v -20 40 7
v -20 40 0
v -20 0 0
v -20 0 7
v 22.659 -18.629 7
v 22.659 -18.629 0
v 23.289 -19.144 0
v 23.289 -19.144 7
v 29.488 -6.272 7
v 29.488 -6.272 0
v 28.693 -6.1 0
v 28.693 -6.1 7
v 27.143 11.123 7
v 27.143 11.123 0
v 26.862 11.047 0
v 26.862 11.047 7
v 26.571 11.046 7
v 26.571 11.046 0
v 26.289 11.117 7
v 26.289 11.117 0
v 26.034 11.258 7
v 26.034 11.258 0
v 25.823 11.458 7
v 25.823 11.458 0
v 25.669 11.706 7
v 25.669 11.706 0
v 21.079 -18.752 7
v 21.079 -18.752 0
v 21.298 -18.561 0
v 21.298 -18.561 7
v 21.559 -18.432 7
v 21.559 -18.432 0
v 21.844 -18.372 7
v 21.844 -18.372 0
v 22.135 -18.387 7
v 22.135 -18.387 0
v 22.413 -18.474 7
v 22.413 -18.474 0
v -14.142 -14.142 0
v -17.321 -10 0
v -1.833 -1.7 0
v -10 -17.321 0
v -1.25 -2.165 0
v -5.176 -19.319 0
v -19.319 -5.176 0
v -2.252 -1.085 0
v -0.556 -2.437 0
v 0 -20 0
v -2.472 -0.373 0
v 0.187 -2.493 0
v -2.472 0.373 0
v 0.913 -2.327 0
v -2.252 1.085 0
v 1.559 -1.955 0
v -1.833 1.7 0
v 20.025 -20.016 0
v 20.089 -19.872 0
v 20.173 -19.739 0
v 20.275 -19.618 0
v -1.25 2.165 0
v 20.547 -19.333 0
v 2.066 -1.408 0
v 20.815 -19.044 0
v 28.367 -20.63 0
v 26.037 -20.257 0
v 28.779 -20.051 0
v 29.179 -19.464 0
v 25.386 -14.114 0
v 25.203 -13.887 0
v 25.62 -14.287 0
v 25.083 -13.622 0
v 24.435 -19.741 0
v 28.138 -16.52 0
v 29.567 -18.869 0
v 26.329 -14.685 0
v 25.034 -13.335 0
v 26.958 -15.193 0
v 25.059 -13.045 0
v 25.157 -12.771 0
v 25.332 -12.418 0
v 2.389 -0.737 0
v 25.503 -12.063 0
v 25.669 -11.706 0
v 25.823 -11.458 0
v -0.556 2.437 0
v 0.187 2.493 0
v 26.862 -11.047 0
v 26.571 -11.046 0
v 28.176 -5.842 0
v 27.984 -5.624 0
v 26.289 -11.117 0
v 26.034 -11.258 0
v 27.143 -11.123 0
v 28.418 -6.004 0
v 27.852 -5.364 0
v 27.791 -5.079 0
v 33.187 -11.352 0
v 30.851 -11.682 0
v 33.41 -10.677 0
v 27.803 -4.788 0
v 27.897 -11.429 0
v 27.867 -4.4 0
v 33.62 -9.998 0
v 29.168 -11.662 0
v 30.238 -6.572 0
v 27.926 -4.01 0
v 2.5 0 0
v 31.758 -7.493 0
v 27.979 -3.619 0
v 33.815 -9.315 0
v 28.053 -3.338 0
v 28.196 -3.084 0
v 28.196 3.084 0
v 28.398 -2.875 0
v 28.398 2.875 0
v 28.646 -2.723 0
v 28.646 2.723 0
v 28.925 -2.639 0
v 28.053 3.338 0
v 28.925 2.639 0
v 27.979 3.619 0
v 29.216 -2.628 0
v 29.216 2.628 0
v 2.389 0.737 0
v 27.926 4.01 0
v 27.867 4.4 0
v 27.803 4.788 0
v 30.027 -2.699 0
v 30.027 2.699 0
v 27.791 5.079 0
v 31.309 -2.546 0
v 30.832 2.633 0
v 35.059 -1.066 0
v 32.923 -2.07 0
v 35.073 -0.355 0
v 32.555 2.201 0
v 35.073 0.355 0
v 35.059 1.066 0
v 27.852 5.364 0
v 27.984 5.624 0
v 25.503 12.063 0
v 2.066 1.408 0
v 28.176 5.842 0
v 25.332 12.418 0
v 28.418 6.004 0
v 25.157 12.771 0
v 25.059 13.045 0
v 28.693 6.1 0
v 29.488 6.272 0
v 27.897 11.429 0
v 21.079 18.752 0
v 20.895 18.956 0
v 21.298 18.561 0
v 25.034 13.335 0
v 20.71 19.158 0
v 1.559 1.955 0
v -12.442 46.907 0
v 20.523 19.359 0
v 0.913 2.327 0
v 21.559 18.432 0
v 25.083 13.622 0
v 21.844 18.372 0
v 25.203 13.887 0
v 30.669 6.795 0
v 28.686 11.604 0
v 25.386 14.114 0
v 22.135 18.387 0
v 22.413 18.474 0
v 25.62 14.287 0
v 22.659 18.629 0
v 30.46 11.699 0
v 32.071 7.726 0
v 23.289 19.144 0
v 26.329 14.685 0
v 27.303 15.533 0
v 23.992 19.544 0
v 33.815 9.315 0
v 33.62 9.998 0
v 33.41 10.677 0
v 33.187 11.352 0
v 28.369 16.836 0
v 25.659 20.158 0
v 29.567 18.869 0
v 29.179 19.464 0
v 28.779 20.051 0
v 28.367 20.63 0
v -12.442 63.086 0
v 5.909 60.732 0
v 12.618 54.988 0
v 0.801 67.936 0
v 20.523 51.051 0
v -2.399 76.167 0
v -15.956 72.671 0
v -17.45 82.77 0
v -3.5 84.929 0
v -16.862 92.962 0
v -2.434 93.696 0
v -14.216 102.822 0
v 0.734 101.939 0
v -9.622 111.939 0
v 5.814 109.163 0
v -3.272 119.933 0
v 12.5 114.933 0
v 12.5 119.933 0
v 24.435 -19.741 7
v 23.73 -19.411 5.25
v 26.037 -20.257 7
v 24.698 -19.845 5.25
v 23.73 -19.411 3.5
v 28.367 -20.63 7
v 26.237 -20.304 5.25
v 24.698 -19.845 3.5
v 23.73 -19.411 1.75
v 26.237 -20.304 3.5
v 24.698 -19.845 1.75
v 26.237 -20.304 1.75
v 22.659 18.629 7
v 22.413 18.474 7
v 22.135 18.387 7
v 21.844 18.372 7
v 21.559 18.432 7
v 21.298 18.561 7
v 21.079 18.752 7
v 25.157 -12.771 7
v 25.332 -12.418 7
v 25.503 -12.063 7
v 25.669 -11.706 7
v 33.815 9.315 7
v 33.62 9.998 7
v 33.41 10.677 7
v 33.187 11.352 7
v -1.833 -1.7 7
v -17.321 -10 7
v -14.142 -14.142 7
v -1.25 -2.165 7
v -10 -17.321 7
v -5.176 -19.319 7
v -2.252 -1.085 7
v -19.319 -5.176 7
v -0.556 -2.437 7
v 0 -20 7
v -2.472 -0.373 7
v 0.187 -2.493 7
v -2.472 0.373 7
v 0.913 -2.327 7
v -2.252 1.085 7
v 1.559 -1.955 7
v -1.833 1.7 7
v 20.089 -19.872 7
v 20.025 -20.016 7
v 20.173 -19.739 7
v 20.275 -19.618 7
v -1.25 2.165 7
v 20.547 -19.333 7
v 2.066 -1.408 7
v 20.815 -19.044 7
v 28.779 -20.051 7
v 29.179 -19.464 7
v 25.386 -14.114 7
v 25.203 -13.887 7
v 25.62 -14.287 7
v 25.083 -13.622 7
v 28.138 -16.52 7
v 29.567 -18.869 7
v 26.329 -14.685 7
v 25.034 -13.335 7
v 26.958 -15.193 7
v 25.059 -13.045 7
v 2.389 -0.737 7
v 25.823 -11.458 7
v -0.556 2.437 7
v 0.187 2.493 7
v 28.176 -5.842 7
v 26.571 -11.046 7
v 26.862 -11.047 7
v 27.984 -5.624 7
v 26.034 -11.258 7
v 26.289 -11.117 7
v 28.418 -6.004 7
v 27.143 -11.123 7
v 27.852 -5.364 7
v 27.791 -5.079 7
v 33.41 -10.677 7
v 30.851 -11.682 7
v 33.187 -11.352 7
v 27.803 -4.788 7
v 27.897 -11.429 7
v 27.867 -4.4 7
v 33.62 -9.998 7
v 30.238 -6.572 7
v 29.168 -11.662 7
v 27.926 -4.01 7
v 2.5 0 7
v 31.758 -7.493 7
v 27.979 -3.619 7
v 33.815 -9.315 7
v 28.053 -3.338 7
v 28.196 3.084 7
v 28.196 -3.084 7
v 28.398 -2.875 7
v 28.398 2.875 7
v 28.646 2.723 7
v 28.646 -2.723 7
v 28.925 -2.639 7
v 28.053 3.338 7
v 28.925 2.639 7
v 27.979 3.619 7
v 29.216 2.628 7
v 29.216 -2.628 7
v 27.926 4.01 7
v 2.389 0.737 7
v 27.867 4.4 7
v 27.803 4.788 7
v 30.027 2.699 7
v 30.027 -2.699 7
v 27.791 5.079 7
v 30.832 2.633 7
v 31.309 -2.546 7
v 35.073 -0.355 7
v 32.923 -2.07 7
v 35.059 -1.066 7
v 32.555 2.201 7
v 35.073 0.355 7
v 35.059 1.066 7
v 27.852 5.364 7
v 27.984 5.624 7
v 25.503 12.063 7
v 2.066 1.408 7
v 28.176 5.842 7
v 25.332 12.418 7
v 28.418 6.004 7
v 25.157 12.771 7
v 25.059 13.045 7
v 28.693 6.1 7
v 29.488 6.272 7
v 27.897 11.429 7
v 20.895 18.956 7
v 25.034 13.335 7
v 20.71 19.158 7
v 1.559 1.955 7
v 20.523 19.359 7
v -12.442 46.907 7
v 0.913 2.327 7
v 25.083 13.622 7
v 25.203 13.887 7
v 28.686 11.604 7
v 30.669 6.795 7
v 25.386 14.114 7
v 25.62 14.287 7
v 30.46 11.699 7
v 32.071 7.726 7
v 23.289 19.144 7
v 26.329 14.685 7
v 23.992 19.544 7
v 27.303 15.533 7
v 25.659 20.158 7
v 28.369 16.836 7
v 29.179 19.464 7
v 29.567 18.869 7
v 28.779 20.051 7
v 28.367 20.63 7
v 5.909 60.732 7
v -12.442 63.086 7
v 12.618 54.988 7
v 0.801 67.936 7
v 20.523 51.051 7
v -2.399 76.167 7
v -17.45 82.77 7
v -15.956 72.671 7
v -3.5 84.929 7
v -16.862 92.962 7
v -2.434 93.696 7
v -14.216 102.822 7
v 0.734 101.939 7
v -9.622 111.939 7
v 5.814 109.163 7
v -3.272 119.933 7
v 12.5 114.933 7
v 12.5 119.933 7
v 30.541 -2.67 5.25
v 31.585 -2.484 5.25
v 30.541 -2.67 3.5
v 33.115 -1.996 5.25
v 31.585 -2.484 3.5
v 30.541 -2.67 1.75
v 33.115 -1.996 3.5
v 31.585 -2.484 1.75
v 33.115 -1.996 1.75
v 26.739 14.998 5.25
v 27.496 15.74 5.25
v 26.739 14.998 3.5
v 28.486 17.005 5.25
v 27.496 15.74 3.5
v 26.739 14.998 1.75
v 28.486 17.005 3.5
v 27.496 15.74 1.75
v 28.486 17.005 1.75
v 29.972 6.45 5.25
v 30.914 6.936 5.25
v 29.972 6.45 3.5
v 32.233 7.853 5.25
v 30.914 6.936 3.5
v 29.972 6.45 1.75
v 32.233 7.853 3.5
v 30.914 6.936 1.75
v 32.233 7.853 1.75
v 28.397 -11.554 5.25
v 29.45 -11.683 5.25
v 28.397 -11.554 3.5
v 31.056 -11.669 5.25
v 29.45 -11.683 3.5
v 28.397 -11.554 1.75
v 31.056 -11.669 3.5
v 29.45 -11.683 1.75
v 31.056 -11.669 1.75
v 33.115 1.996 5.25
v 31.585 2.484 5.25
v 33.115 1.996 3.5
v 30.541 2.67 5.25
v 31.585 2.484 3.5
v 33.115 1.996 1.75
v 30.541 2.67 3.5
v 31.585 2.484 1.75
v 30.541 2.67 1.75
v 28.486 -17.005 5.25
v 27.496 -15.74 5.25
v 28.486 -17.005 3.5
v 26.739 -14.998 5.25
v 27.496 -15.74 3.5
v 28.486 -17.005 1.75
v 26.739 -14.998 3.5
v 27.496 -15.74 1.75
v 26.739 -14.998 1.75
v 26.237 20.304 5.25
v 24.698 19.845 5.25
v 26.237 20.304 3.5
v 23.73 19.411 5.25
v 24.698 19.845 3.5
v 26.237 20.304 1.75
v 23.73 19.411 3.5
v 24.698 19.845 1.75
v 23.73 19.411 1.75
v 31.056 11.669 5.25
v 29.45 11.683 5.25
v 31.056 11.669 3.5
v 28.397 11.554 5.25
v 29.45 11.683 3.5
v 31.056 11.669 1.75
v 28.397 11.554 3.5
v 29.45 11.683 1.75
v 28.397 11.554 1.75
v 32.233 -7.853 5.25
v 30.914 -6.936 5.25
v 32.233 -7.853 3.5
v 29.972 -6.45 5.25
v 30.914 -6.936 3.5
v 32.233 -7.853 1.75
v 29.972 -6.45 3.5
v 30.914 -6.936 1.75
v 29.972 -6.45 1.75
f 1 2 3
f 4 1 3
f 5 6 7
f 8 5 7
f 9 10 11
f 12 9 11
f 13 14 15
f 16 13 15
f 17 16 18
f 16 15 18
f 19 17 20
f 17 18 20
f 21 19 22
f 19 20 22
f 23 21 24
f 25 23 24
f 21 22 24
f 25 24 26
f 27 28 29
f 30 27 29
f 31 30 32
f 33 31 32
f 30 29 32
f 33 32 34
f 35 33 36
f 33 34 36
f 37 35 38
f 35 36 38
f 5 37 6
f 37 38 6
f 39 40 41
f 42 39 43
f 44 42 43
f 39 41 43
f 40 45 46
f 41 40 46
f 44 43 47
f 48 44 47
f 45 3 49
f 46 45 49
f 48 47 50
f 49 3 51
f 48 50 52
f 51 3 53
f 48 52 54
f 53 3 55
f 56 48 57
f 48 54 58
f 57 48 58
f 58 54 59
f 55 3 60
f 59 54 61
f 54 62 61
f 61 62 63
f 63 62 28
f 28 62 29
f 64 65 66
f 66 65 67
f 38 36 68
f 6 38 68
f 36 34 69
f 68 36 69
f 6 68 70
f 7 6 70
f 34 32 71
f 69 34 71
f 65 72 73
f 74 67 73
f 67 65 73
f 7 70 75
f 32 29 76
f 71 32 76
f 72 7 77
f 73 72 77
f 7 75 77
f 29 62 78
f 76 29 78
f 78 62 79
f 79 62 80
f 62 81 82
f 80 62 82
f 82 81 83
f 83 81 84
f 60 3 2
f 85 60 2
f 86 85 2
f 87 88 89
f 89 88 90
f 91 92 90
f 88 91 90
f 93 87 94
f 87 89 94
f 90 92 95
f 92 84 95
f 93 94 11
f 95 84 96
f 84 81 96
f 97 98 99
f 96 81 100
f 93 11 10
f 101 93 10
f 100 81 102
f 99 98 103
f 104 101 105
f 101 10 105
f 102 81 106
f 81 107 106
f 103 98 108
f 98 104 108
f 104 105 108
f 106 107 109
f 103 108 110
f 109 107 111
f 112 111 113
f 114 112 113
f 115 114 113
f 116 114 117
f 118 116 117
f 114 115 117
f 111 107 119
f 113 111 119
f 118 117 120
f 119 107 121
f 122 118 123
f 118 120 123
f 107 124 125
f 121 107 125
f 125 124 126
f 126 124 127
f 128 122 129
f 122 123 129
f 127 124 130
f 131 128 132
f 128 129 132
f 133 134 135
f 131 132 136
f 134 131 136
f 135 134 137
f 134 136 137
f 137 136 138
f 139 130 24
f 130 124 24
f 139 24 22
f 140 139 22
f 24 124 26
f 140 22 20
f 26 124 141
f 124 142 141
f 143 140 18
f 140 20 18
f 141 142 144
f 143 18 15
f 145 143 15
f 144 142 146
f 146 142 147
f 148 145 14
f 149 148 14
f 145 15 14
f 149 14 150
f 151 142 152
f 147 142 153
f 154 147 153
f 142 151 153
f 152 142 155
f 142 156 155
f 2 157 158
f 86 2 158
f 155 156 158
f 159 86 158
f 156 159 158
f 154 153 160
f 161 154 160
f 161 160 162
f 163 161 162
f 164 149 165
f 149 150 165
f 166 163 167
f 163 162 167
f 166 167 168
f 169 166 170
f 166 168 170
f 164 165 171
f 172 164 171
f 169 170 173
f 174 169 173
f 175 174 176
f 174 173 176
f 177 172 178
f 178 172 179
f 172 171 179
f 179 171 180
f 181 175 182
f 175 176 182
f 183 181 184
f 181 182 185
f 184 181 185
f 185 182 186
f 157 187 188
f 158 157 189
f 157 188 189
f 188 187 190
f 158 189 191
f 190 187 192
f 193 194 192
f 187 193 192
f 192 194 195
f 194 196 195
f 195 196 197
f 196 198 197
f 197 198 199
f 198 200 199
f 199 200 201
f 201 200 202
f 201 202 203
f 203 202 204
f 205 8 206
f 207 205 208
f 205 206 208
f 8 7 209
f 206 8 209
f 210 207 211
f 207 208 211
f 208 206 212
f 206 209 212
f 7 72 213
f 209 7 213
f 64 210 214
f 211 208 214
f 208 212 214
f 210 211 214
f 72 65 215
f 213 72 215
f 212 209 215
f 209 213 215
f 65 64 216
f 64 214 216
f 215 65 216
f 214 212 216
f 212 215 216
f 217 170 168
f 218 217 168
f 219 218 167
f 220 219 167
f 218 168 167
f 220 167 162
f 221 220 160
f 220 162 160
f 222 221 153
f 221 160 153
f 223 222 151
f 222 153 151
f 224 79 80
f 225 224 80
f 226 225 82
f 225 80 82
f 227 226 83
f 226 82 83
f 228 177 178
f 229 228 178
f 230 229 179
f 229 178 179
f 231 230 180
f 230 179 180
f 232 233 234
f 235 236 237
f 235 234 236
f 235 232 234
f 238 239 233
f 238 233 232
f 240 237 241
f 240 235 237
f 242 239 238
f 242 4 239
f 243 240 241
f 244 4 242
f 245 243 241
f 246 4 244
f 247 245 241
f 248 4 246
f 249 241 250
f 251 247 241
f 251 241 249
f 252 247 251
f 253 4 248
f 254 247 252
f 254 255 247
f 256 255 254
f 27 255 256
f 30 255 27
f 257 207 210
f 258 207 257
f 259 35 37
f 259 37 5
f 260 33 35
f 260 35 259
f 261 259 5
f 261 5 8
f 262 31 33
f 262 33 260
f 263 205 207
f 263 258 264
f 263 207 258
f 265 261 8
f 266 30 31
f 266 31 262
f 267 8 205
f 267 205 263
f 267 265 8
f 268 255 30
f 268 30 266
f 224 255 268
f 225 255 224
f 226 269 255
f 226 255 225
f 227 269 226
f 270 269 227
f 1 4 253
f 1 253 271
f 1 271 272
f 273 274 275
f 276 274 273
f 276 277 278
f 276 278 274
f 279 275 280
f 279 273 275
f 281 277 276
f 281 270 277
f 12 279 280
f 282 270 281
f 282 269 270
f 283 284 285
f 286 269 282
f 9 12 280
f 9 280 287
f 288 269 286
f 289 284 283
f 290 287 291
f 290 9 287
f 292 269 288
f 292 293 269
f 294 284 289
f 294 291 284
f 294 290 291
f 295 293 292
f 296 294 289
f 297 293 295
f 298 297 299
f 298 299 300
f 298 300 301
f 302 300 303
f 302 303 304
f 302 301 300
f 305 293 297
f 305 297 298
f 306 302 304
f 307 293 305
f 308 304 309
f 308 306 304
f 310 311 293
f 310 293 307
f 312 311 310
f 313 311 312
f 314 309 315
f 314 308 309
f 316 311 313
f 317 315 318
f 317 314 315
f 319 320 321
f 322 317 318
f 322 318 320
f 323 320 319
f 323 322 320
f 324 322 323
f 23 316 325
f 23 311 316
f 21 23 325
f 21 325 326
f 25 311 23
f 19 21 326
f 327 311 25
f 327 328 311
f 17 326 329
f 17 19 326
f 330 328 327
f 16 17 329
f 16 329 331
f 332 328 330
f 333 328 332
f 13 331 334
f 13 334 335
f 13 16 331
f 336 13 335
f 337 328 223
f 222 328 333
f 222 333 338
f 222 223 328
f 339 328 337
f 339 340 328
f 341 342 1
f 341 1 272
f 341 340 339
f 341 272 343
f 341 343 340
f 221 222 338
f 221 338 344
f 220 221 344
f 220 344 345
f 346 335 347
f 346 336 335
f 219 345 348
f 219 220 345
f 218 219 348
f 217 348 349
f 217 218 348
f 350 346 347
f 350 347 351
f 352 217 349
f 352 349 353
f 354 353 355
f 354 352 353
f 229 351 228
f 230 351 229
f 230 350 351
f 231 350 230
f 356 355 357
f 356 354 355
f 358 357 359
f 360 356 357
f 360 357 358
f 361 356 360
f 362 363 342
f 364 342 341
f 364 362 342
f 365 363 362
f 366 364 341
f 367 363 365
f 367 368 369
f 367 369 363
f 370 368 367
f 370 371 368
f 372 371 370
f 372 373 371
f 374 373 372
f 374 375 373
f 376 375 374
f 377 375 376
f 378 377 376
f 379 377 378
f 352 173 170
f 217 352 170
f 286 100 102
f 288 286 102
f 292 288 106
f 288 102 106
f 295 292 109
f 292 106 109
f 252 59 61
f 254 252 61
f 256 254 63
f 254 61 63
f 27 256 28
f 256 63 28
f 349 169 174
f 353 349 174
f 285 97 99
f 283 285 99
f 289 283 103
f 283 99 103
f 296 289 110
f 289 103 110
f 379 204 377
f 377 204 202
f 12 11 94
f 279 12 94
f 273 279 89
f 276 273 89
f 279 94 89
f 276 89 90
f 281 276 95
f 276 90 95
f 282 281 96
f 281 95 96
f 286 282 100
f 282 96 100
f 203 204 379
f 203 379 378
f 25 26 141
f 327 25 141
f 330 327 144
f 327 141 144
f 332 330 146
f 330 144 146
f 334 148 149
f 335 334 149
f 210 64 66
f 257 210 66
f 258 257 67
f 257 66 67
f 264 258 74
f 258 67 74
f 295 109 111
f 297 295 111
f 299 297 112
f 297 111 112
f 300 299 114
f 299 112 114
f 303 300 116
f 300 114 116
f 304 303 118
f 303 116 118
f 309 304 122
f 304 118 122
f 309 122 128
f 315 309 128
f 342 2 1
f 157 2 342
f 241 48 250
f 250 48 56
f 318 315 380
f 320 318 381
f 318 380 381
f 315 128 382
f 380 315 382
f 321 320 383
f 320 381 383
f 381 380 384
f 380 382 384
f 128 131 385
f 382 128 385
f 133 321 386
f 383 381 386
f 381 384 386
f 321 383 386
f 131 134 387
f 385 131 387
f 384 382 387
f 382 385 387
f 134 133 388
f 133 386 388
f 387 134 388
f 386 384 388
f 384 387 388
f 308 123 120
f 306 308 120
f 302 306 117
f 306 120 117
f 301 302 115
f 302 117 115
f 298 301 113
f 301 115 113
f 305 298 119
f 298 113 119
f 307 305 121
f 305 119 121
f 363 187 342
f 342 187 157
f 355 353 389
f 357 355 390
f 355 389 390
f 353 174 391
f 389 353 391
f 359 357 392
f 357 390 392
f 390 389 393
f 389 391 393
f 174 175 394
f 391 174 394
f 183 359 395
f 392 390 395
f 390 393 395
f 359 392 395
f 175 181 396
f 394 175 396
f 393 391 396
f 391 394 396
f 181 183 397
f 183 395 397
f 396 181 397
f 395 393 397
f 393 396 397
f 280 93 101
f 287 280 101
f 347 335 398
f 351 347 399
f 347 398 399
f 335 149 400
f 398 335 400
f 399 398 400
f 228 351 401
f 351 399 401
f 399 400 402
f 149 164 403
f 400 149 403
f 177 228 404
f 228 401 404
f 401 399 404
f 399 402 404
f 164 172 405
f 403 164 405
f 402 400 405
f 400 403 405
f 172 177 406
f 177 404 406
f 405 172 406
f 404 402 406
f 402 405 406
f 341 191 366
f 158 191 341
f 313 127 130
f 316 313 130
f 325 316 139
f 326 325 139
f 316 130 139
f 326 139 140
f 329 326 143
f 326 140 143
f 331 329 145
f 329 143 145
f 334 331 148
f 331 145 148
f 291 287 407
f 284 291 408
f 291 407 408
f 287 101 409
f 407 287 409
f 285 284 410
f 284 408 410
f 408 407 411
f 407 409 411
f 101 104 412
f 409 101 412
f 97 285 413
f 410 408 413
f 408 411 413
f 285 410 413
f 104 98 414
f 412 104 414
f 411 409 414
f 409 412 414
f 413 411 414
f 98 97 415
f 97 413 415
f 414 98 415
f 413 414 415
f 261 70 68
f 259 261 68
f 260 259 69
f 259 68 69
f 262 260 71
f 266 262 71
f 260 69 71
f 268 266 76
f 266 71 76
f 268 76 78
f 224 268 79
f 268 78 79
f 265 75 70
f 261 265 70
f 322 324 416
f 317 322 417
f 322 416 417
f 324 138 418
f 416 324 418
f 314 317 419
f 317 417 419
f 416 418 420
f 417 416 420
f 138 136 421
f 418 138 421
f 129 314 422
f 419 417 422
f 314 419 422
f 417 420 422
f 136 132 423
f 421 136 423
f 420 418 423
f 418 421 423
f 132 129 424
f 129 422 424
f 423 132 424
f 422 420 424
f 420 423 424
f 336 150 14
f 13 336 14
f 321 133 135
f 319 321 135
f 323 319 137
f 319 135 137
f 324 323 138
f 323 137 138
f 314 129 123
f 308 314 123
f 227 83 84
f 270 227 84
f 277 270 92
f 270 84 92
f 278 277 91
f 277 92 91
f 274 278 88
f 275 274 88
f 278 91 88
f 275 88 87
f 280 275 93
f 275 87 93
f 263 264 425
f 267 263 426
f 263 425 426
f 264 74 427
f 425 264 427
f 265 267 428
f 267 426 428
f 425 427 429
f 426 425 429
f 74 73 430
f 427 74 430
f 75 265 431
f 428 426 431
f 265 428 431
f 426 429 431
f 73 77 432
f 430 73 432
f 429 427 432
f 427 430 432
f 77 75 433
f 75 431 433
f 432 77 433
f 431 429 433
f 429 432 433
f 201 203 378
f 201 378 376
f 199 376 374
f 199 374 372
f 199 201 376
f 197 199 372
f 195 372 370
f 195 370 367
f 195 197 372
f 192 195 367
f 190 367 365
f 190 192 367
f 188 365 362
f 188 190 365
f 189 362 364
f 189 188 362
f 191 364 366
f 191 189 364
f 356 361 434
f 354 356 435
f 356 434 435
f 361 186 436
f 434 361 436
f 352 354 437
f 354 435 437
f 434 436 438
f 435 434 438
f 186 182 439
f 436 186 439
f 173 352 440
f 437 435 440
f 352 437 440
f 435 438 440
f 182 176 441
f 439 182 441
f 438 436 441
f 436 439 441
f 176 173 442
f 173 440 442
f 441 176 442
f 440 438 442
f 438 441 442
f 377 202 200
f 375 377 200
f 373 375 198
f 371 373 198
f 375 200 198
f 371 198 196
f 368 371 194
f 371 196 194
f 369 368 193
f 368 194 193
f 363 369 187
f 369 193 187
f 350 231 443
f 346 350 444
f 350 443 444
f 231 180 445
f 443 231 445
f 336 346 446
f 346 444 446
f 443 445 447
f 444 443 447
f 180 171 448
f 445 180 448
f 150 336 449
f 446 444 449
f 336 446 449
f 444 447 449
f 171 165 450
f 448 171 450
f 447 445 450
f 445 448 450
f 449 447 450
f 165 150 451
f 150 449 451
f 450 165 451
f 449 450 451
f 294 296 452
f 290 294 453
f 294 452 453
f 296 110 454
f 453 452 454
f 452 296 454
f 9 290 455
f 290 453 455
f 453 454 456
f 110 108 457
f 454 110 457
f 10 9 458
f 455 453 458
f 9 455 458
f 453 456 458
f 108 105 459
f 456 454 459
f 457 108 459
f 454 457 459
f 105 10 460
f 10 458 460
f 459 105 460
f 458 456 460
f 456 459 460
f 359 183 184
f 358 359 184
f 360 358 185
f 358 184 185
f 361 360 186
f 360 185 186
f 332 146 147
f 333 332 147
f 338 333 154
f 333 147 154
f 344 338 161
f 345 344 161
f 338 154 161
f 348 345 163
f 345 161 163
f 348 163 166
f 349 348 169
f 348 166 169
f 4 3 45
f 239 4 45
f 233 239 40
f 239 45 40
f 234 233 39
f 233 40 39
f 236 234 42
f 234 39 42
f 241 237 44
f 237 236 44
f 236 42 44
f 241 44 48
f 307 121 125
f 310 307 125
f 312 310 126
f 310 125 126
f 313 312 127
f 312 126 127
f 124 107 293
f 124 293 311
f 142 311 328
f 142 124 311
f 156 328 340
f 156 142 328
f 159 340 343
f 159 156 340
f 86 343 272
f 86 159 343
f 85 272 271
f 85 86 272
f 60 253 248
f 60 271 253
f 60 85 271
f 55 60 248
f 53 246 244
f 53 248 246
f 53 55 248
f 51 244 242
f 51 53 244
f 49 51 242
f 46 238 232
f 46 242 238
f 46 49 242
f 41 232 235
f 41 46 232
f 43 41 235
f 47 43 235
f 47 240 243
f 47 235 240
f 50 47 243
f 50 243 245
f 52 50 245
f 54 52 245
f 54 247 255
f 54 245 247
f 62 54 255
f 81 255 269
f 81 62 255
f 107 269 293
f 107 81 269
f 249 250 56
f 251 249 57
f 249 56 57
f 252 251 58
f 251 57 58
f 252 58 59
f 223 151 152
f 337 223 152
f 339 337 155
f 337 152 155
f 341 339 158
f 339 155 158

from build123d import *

# Parameters (mm, degrees)
SKETCH002_W       = 3.675859
SKETCH002_H       = 9.820133
PAD002_DEPTH      = 10
CYLINDER001_R     = 2.5
CYLINDER001_DEPTH = 30
PAD_DEPTH         = 7
PAD001_DEPTH      = 7


with BuildPart() as gearcutter_g:
    # Sketch002 → Pad002 (new body)
    with BuildSketch(Plane.XY):
        with BuildLine():
            Line((-20, 35), (-38.772621, 35))
            Line((-38.772621, 35), (-38.772621, -38.212818))
            Line((-38.772621, -38.212818), (39.418999, -38.212818))
            Line((20.044458, -20.01598), (39.418999, -38.212818))
            Line((0, -20), (20.044458, -20.01598))
            ThreePointArc((-20, 0), (-14.142136, -14.142136), (0, -20))
            Line((-20, 35), (-20, 0))
        make_face()
        with Locations((21.83793, 25.089934)):
            Rectangle(SKETCH002_W, SKETCH002_H)
    extrude(amount=PAD002_DEPTH)


with BuildPart() as hole:
    # Cylinder001 → Cylinder001 (new body)
    with BuildSketch(Plane.XY.offset(-10)):
        Circle(CYLINDER001_R)
    extrude(amount=CYLINDER001_DEPTH)


with BuildPart() as cut001:
    # InvoluteGear → Pad (new body)
    with BuildSketch(Plane.XY):
        with BuildLine():
            Line((29.216017, -2.627852), (30.02668, -2.698596))
            add(Edge.make_bspline(
                [(30.02668, -2.698596), (30.269336, -2.702327), (31.240634, -2.684194), (32.940327, -2.265756), (35.058609, -1.065575)],
                knots=[0, 0, 0, 0, 0, 1, 1, 1, 1, 1], degree=4))
            ThreePointArc((35.058609, -1.065575), (35.074799, 0), (35.058609, 1.065575))
            add(Edge.make_bspline(
                [(35.058609, 1.065575), (32.940327, 2.265756), (31.240634, 2.684194), (30.269336, 2.702327), (30.02668, 2.698596)],
                knots=[0, 0, 0, 0, 0, 1, 1, 1, 1, 1], degree=4))
            Line((30.02668, 2.698596), (29.216017, 2.627852))
            ThreePointArc((29.216017, 2.627852), (28.398075, 2.874673), (27.979368, 3.61941))
            ThreePointArc((27.979368, 3.61941), (27.89739, 4.204855), (27.803163, 4.788454))
            ThreePointArc((27.803163, 4.788454), (27.983753, 5.62352), (28.692604, 6.100468))
            Line((28.692604, 6.100468), (29.488104, 6.271815))
            add(Edge.make_bspline(
                [(29.488104, 6.271815), (29.72108, 6.339774), (30.64388, 6.643396), (32.144724, 7.544237), (33.815137, 9.315472)],
                knots=[0, 0, 0, 0, 0, 1, 1, 1, 1, 1], degree=4))
            ThreePointArc((33.815137, 9.315472), (33.516524, 10.338478), (33.18697, 11.351941))
            add(Edge.make_bspline(
                [(33.18697, 11.351941), (30.809038, 11.874427), (29.06152, 11.773281), (28.12803, 11.504313), (27.897254, 11.429224)],
                knots=[0, 0, 0, 0, 0, 1, 1, 1, 1, 1], degree=4))
            Line((27.897254, 11.429224), (27.143458, 11.122676))
            ThreePointArc((27.143458, 11.122676), (26.289104, 11.117439), (25.669483, 11.705673))
            ThreePointArc((25.669483, 11.705673), (25.418584, 12.240945), (25.156525, 12.770842))
            ThreePointArc((25.156525, 12.770842), (25.082952, 13.622039), (25.619728, 14.286735))
            Line((25.619728, 14.286735), (26.32938, 14.684947))
            add(Edge.make_bspline(
                [(26.32938, 14.684947), (26.531974, 14.818557), (27.324283, 15.380691), (28.492921, 16.683892), (29.567042, 18.868799)],
                knots=[0, 0, 0, 0, 0, 1, 1, 1, 1, 1], degree=4))
            ThreePointArc((29.567042, 18.868799), (28.980159, 19.758338), (28.366523, 20.629637))
            add(Edge.make_bspline(
                [(28.366523, 20.629637), (25.94023, 20.428003), (24.300163, 19.816261), (23.487425, 19.284092), (23.289034, 19.144315)],
                knots=[0, 0, 0, 0, 0, 1, 1, 1, 1, 1], degree=4))
            Line((23.289034, 19.144315), (22.659084, 18.629202))
            ThreePointArc((22.659084, 18.629202), (21.84423, 18.372372), (21.078752, 18.751836))
            ThreePointArc((21.078752, 18.751836), (20.681226, 19.189373), (20.274619, 19.618485))
            ThreePointArc((20.274619, 19.618485), (19.95342, 20.41018), (20.270426, 21.203563))
            Line((20.270426, 21.203563), (20.831176, 21.793257))
            add(Edge.make_bspline(
                [(20.831176, 21.793257), (20.985387, 21.980647), (21.576804, 22.751344), (22.309397, 24.341109), (22.691785, 26.745549)],
                knots=[0, 0, 0, 0, 0, 1, 1, 1, 1, 1], degree=4))
            ThreePointArc((22.691785, 26.745549), (21.868779, 27.422582), (21.025585, 28.074299))
            add(Edge.make_bspline(
                [(21.025585, 28.074299), (18.766519, 27.166461), (17.37963, 26.098479), (16.759858, 25.350393), (16.611482, 25.15835)],
                knots=[0, 0, 0, 0, 0, 1, 1, 1, 1, 1], degree=4))
            Line((16.611482, 25.15835), (16.161351, 24.480441))
            ThreePointArc((16.161351, 24.480441), (15.4584, 23.994839), (14.615082, 24.131816))
            ThreePointArc((14.615082, 24.131816), (14.10625, 24.432742), (13.591225, 24.72294))
            ThreePointArc((13.591225, 24.72294), (13.05094, 25.384787), (13.120008, 26.236361))
            Line((13.120008, 26.236361), (13.48203, 26.96514))
            add(Edge.make_bspline(
                [(13.48203, 26.96514), (13.574155, 27.18966), (13.912131, 28.10044), (14.143586, 29.835512), (13.800264, 32.245841)],
                knots=[0, 0, 0, 0, 0, 1, 1, 1, 1, 1], degree=4))
            ThreePointArc((13.800264, 32.245841), (12.814263, 32.65021), (11.816433, 33.024437))
            add(Edge.make_bspline(
                [(11.816433, 33.024437), (9.92532, 31.49106), (8.91484, 30.061732), (8.543105, 29.164202), (8.457926, 28.936956)],
                knots=[0, 0, 0, 0, 0, 1, 1, 1, 1, 1], degree=4))
            Line((8.457926, 28.936956), (8.227611, 28.156485))
            ThreePointArc((8.227611, 28.156485), (7.699024, 27.485259), (6.852797, 27.367578))
            ThreePointArc((6.852797, 27.367578), (6.277872, 27.505154), (5.70019, 27.630653))
            ThreePointArc((5.70019, 27.630653), (4.988826, 28.103844), (4.80382, 28.937943))
            Line((4.80382, 28.937943), (4.934946, 29.741053))
            add(Edge.make_bspline(
                [(4.934946, 29.741053), (4.956801, 29.982752), (5.011304, 30.952689), (4.721054, 32.678899), (3.682528, 34.880948)],
                knots=[0, 0, 0, 0, 0, 1, 1, 1, 1, 1], degree=4))
            ThreePointArc((3.682528, 34.880948), (2.621143, 34.976723), (1.557338, 35.040209))
            add(Edge.make_bspline(
                [(1.557338, 35.040209), (0.202213, 33.01754), (-0.342073, 31.353869), (-0.43274, 30.386642), (-0.447153, 30.144385)],
                knots=[0, 0, 0, 0, 0, 1, 1, 1, 1, 1], degree=4))
            Line((-0.447153, 30.144385), (-0.437188, 29.330703))
            ThreePointArc((-0.437188, 29.330703), (-0.744444, 28.533493), (-1.518389, 28.171611))
            ThreePointArc((-1.518389, 28.171611), (-2.108323, 28.133612), (-2.697331, 28.083261))
            ThreePointArc((-2.697331, 28.083261), (-3.516567, 28.325751), (-3.939209, 29.068262))
            Line((-3.939209, 29.068262), (-4.050629, 29.874342))
            add(Edge.make_bspline(
                [(-4.050629, 29.874342), (-4.100987, 30.111745), (-4.3348, 31.054656), (-5.120964, 32.618623), (-6.762416, 34.416729)],
                knots=[0, 0, 0, 0, 0, 1, 1, 1, 1, 1], degree=4))
            ThreePointArc((-6.762416, 34.416729), (-7.804877, 34.195401), (-8.840133, 33.942504))
            add(Edge.make_bspline(
                [(-8.840133, 33.942504), (-9.538861, 31.610267), (-9.56859, 29.860077), (-9.370135, 28.909097), (-9.312501, 28.673354)],
                knots=[0, 0, 0, 0, 0, 1, 1, 1, 1, 1], degree=4))
            Line((-9.312501, 28.673354), (-9.063142, 27.898758))
            ThreePointArc((-9.063142, 27.898758), (-9.121765, 27.046401), (-9.754659, 26.472472))
            ThreePointArc((-9.754659, 26.472472), (-10.307184, 26.262276), (-10.855183, 26.040548))
            ThreePointArc((-10.855183, 26.040548), (-11.709498, 26.030791), (-12.332222, 26.615739))
            Line((-12.332222, 26.615739), (-12.676288, 27.353165))
            add(Edge.make_bspline(
                [(-12.676288, 27.353165), (-12.794385, 27.565178), (-13.295737, 28.39728), (-14.507962, 29.660038), (-16.60649, 30.894434)],
                knots=[0, 0, 0, 0, 0, 1, 1, 1, 1, 1], degree=4))
            ThreePointArc((-16.60649, 30.894434), (-17.537399, 30.375667), (-18.452119, 29.828859))
            add(Edge.make_bspline(
                [(-18.452119, 29.828859), (-18.432366, 27.394282), (-17.944897, 25.713086), (-17.474952, 24.862851), (-17.350392, 24.65457)],
                knots=[0, 0, 0, 0, 0, 1, 1, 1, 1, 1], degree=4))
            Line((-17.350392, 24.65457), (-16.883795, 23.987887))
            ThreePointArc((-16.883795, 23.987887), (-16.688578, 23.156118), (-17.124185, 22.421138))
            ThreePointArc((-17.124185, 22.421138), (-17.590206, 22.057421), (-18.048504, 21.684019))
            ThreePointArc((-18.048504, 21.684019), (-18.861988, 21.422881), (-19.629463, 21.79829))
            Line((-19.629463, 21.79829), (-20.175603, 22.401539))
            add(Edge.make_bspline(
                [(-20.175603, 22.401539), (-20.350945, 22.569323), (-21.07529, 23.216681), (-22.605863, 24.066029), (-24.975004, 24.627032)],
                knots=[0, 0, 0, 0, 0, 1, 1, 1, 1, 1], degree=4))
            ThreePointArc((-24.975004, 24.627032), (-25.711647, 23.856922), (-26.424554, 23.064789))
            add(Edge.make_bspline(
                [(-26.424554, 23.064789), (-25.688074, 20.744196), (-24.726721, 19.281374), (-24.027043, 18.607432), (-23.846625, 18.445118)],
                knots=[0, 0, 0, 0, 0, 1, 1, 1, 1, 1], degree=4))
            Line((-23.846625, 18.445118), (-23.204249, 17.945586))
            ThreePointArc((-23.204249, 17.945586), (-22.772537, 17.208312), (-22.972152, 16.377588))
            ThreePointArc((-22.972152, 16.377588), (-23.310261, 15.892667), (-23.638136, 15.400768))
            ThreePointArc((-23.638136, 15.400768), (-24.338508, 14.911454), (-25.182539, 15.043968))
            Line((-25.182539, 15.043968), (-25.882227, 15.459439))
            add(Edge.make_bspline(
                [(-25.882227, 15.459439), (-26.099234, 15.568085), (-26.982211, 15.973178), (-28.695135, 16.333648), (-31.12438, 16.17141)],
                knots=[0, 0, 0, 0, 0, 1, 1, 1, 1, 1], degree=4))
            ThreePointArc((-31.12438, 16.17141), (-31.601302, 15.218385), (-32.049051, 14.251311))
            add(Edge.make_bspline(
                [(-32.049051, 14.251311), (-30.661284, 12.250897), (-29.311467, 11.136428), (-28.444225, 10.698661), (-28.22398, 10.596737)],
                knots=[0, 0, 0, 0, 0, 1, 1, 1, 1, 1], degree=4))
            Line((-28.22398, 10.596737), (-27.462904, 10.308742))
            ThreePointArc((-27.462904, 10.308742), (-26.833056, 9.731472), (-26.778943, 8.878817))
            ThreePointArc((-26.778943, 8.878817), (-26.959098, 8.31578), (-27.127416, 7.749093))
            ThreePointArc((-27.127416, 7.749093), (-27.652445, 7.075079), (-28.498037, 6.952923))
            Line((-28.498037, 6.952923), (-29.289102, 7.143699))
            add(Edge.make_bspline(
                [(-29.289102, 7.143699), (-29.528492, 7.183554), (-30.491644, 7.310388), (-32.234718, 7.14995), (-34.508218, 6.278888)],
                knots=[0, 0, 0, 0, 0, 1, 1, 1, 1, 1], degree=4))
            ThreePointArc((-34.508218, 6.278888), (-34.683042, 5.227628), (-34.825849, 4.171541))
            add(Edge.make_bspline(
                [(-34.825849, 4.171541), (-32.910105, 2.669052), (-31.29176, 2.001961), (-30.334014, 1.839267), (-30.093511, 1.80679)],
                knots=[0, 0, 0, 0, 0, 1, 1, 1, 1, 1], degree=4))
            Line((-30.093511, 1.80679), (-29.281359, 1.75592))
            ThreePointArc((-29.281359, 1.75592), (-28.50934, 1.389948), (-28.206307, 0.591124))
            ThreePointArc((-28.206307, 0.591124), (-28.2125, 0), (-28.206307, -0.591124))
            ThreePointArc((-28.206307, -0.591124), (-28.50934, -1.389948), (-29.281359, -1.75592))
            Line((-29.281359, -1.75592), (-30.093511, -1.80679))
            add(Edge.make_bspline(
                [(-30.093511, -1.80679), (-30.334014, -1.839267), (-31.29176, -2.001961), (-32.910105, -2.669052), (-34.825849, -4.171541)],
                knots=[0, 0, 0, 0, 0, 1, 1, 1, 1, 1], degree=4))
            ThreePointArc((-34.825849, -4.171541), (-34.683042, -5.227628), (-34.508218, -6.278888))
            add(Edge.make_bspline(
                [(-34.508218, -6.278888), (-32.234718, -7.14995), (-30.491644, -7.310388), (-29.528492, -7.183554), (-29.289102, -7.143699)],
                knots=[0, 0, 0, 0, 0, 1, 1, 1, 1, 1], degree=4))
            Line((-29.289102, -7.143699), (-28.498037, -6.952923))
            ThreePointArc((-28.498037, -6.952923), (-27.652445, -7.075079), (-27.127416, -7.749093))
            ThreePointArc((-27.127416, -7.749093), (-26.959098, -8.31578), (-26.778943, -8.878817))
            ThreePointArc((-26.778943, -8.878817), (-26.833056, -9.731472), (-27.462904, -10.308742))
            Line((-27.462904, -10.308742), (-28.22398, -10.596737))
            add(Edge.make_bspline(
                [(-28.22398, -10.596737), (-28.444225, -10.698661), (-29.311467, -11.136428), (-30.661284, -12.250897), (-32.049051, -14.251311)],
                knots=[0, 0, 0, 0, 0, 1, 1, 1, 1, 1], degree=4))
            ThreePointArc((-32.049051, -14.251311), (-31.601302, -15.218385), (-31.12438, -16.17141))
            add(Edge.make_bspline(
                [(-31.12438, -16.17141), (-28.695135, -16.333648), (-26.982211, -15.973178), (-26.099234, -15.568085), (-25.882227, -15.459439)],
                knots=[0, 0, 0, 0, 0, 1, 1, 1, 1, 1], degree=4))
            Line((-25.882227, -15.459439), (-25.182539, -15.043968))
            ThreePointArc((-25.182539, -15.043968), (-24.338508, -14.911454), (-23.638136, -15.400768))
            ThreePointArc((-23.638136, -15.400768), (-23.310261, -15.892667), (-22.972152, -16.377588))
            ThreePointArc((-22.972152, -16.377588), (-22.772537, -17.208312), (-23.204249, -17.945586))
            Line((-23.204249, -17.945586), (-23.846625, -18.445118))
            add(Edge.make_bspline(
                [(-23.846625, -18.445118), (-24.027043, -18.607432), (-24.726721, -19.281374), (-25.688074, -20.744196), (-26.424554, -23.064789)],
                knots=[0, 0, 0, 0, 0, 1, 1, 1, 1, 1], degree=4))
            ThreePointArc((-26.424554, -23.064789), (-25.711647, -23.856922), (-24.975004, -24.627032))
            add(Edge.make_bspline(
                [(-24.975004, -24.627032), (-22.605863, -24.066029), (-21.07529, -23.216681), (-20.350945, -22.569323), (-20.175603, -22.401539)],
                knots=[0, 0, 0, 0, 0, 1, 1, 1, 1, 1], degree=4))
            Line((-20.175603, -22.401539), (-19.629463, -21.79829))
            ThreePointArc((-19.629463, -21.79829), (-18.861988, -21.422881), (-18.048504, -21.684019))
            ThreePointArc((-18.048504, -21.684019), (-17.590206, -22.057421), (-17.124185, -22.421138))
            ThreePointArc((-17.124185, -22.421138), (-16.688578, -23.156118), (-16.883795, -23.987887))
            Line((-16.883795, -23.987887), (-17.350392, -24.65457))
            add(Edge.make_bspline(
                [(-17.350392, -24.65457), (-17.474952, -24.862851), (-17.944897, -25.713086), (-18.432366, -27.394282), (-18.452119, -29.828859)],
                knots=[0, 0, 0, 0, 0, 1, 1, 1, 1, 1], degree=4))
            ThreePointArc((-18.452119, -29.828859), (-17.537399, -30.375667), (-16.60649, -30.894434))
            add(Edge.make_bspline(
                [(-16.60649, -30.894434), (-14.507962, -29.660038), (-13.295737, -28.39728), (-12.794385, -27.565178), (-12.676288, -27.353165)],
                knots=[0, 0, 0, 0, 0, 1, 1, 1, 1, 1], degree=4))
            Line((-12.676288, -27.353165), (-12.332222, -26.615739))
            ThreePointArc((-12.332222, -26.615739), (-11.709498, -26.030791), (-10.855183, -26.040548))
            ThreePointArc((-10.855183, -26.040548), (-10.307184, -26.262276), (-9.754659, -26.472472))
            ThreePointArc((-9.754659, -26.472472), (-9.121765, -27.046401), (-9.063142, -27.898758))
            Line((-9.063142, -27.898758), (-9.312501, -28.673354))
            add(Edge.make_bspline(
                [(-9.312501, -28.673354), (-9.370135, -28.909097), (-9.56859, -29.860077), (-9.538861, -31.610267), (-8.840133, -33.942504)],
                knots=[0, 0, 0, 0, 0, 1, 1, 1, 1, 1], degree=4))
            ThreePointArc((-8.840133, -33.942504), (-7.804877, -34.195401), (-6.762416, -34.416729))
            add(Edge.make_bspline(
                [(-6.762416, -34.416729), (-5.120964, -32.618623), (-4.3348, -31.054656), (-4.100987, -30.111745), (-4.050629, -29.874342)],
                knots=[0, 0, 0, 0, 0, 1, 1, 1, 1, 1], degree=4))
            Line((-4.050629, -29.874342), (-3.939209, -29.068262))
            ThreePointArc((-3.939209, -29.068262), (-3.516567, -28.325751), (-2.697331, -28.083261))
            ThreePointArc((-2.697331, -28.083261), (-2.108323, -28.133612), (-1.518389, -28.171611))
            ThreePointArc((-1.518389, -28.171611), (-0.744444, -28.533493), (-0.437188, -29.330703))
            Line((-0.437188, -29.330703), (-0.447153, -30.144385))
            add(Edge.make_bspline(
                [(-0.447153, -30.144385), (-0.43274, -30.386642), (-0.342073, -31.353869), (0.202213, -33.01754), (1.557338, -35.040209)],
                knots=[0, 0, 0, 0, 0, 1, 1, 1, 1, 1], degree=4))
            ThreePointArc((1.557338, -35.040209), (2.621143, -34.976723), (3.682528, -34.880948))
            add(Edge.make_bspline(
                [(3.682528, -34.880948), (4.721054, -32.678899), (5.011304, -30.952689), (4.956801, -29.982752), (4.934946, -29.741053)],
                knots=[0, 0, 0, 0, 0, 1, 1, 1, 1, 1], degree=4))
            Line((4.934946, -29.741053), (4.80382, -28.937943))
            ThreePointArc((4.80382, -28.937943), (4.988826, -28.103844), (5.70019, -27.630653))
            ThreePointArc((5.70019, -27.630653), (6.277872, -27.505154), (6.852797, -27.367578))
            ThreePointArc((6.852797, -27.367578), (7.699024, -27.485259), (8.227611, -28.156485))
            Line((8.227611, -28.156485), (8.457926, -28.936956))
            add(Edge.make_bspline(
                [(8.457926, -28.936956), (8.543105, -29.164202), (8.91484, -30.061732), (9.92532, -31.49106), (11.816433, -33.024437)],
                knots=[0, 0, 0, 0, 0, 1, 1, 1, 1, 1], degree=4))
            ThreePointArc((11.816433, -33.024437), (12.814263, -32.65021), (13.800264, -32.245841))
            add(Edge.make_bspline(
                [(13.800264, -32.245841), (14.143586, -29.835512), (13.912131, -28.10044), (13.574155, -27.18966), (13.48203, -26.96514)],
                knots=[0, 0, 0, 0, 0, 1, 1, 1, 1, 1], degree=4))
            Line((13.48203, -26.96514), (13.120008, -26.236361))
            ThreePointArc((13.120008, -26.236361), (13.05094, -25.384787), (13.591225, -24.72294))
            ThreePointArc((13.591225, -24.72294), (14.10625, -24.432742), (14.615082, -24.131816))
            ThreePointArc((14.615082, -24.131816), (15.4584, -23.994839), (16.161351, -24.480441))
            Line((16.161351, -24.480441), (16.611482, -25.15835))
            add(Edge.make_bspline(
                [(16.611482, -25.15835), (16.759858, -25.350393), (17.37963, -26.098479), (18.766519, -27.166461), (21.025585, -28.074299)],
                knots=[0, 0, 0, 0, 0, 1, 1, 1, 1, 1], degree=4))
            ThreePointArc((21.025585, -28.074299), (21.868779, -27.422582), (22.691785, -26.745549))
            add(Edge.make_bspline(
                [(22.691785, -26.745549), (22.309397, -24.341109), (21.576804, -22.751344), (20.985387, -21.980647), (20.831176, -21.793257)],
                knots=[0, 0, 0, 0, 0, 1, 1, 1, 1, 1], degree=4))
            Line((20.831176, -21.793257), (20.270426, -21.203563))
            ThreePointArc((20.270426, -21.203563), (19.95342, -20.41018), (20.274619, -19.618485))
            ThreePointArc((20.274619, -19.618485), (20.681226, -19.189373), (21.078752, -18.751836))
            ThreePointArc((21.078752, -18.751836), (21.84423, -18.372372), (22.659084, -18.629202))
            Line((22.659084, -18.629202), (23.289034, -19.144315))
            add(Edge.make_bspline(
                [(23.289034, -19.144315), (23.487425, -19.284092), (24.300163, -19.816261), (25.94023, -20.428003), (28.366523, -20.629637)],
                knots=[0, 0, 0, 0, 0, 1, 1, 1, 1, 1], degree=4))
            ThreePointArc((28.366523, -20.629637), (28.980159, -19.758338), (29.567042, -18.868799))
            add(Edge.make_bspline(
                [(29.567042, -18.868799), (28.492921, -16.683892), (27.324283, -15.380691), (26.531974, -14.818557), (26.32938, -14.684947)],
                knots=[0, 0, 0, 0, 0, 1, 1, 1, 1, 1], degree=4))
            Line((26.32938, -14.684947), (25.619728, -14.286735))
            ThreePointArc((25.619728, -14.286735), (25.082952, -13.622039), (25.156525, -12.770842))
            ThreePointArc((25.156525, -12.770842), (25.418584, -12.240945), (25.669483, -11.705673))
            ThreePointArc((25.669483, -11.705673), (26.289104, -11.117439), (27.143458, -11.122676))
            Line((27.143458, -11.122676), (27.897254, -11.429224))
            add(Edge.make_bspline(
                [(27.897254, -11.429224), (28.12803, -11.504313), (29.06152, -11.773281), (30.809038, -11.874427), (33.18697, -11.351941)],
                knots=[0, 0, 0, 0, 0, 1, 1, 1, 1, 1], degree=4))
            ThreePointArc((33.18697, -11.351941), (33.516524, -10.338478), (33.815137, -9.315472))
            add(Edge.make_bspline(
                [(33.815137, -9.315472), (32.144724, -7.544237), (30.64388, -6.643396), (29.72108, -6.339774), (29.488104, -6.271815)],
                knots=[0, 0, 0, 0, 0, 1, 1, 1, 1, 1], degree=4))
            Line((29.488104, -6.271815), (28.692604, -6.100468))
            ThreePointArc((28.692604, -6.100468), (27.983753, -5.62352), (27.803163, -4.788454))
            ThreePointArc((27.803163, -4.788454), (27.89739, -4.204855), (27.979368, -3.61941))
            ThreePointArc((27.979368, -3.61941), (28.398075, -2.874673), (29.216017, -2.627852))
        make_face()
    extrude(amount=PAD_DEPTH)

    # Cut: cut hole
    add(hole.part, mode=Mode.SUBTRACT)

    # Cut001: cut gearcutter_g
    add(gearcutter_g.part, mode=Mode.SUBTRACT)


with BuildPart() as pince_g:
    # Sketch001 → Pad001 (new body)
    with BuildSketch(Plane.XY):
        with BuildLine():
            Line((20.522763, 10), (-20, 10))
            Line((-20, 10), (-20, 40))
            Line((-20, 40), (-12.44178, 46.907085))
            Line((-12.44178, 63.085703), (-12.44178, 46.907085))
            ThreePointArc((-3.272439, 119.933259), (-16.862004, 92.961944), (-12.44178, 63.085703))
            Line((12.5, 119.933259), (-3.272439, 119.933259))
            Line((12.5, 119.933259), (12.5, 114.933259))
            ThreePointArc((12.5, 114.933259), (-3.21942, 80.514127), (20.522763, 51.050835))
            Line((20.522763, 51.050835), (20.522763, 10))
        make_face()
    extrude(amount=PAD001_DEPTH)

    # Fusion: union Cut001
    add(cut001.part)


solid = pince_g.part
